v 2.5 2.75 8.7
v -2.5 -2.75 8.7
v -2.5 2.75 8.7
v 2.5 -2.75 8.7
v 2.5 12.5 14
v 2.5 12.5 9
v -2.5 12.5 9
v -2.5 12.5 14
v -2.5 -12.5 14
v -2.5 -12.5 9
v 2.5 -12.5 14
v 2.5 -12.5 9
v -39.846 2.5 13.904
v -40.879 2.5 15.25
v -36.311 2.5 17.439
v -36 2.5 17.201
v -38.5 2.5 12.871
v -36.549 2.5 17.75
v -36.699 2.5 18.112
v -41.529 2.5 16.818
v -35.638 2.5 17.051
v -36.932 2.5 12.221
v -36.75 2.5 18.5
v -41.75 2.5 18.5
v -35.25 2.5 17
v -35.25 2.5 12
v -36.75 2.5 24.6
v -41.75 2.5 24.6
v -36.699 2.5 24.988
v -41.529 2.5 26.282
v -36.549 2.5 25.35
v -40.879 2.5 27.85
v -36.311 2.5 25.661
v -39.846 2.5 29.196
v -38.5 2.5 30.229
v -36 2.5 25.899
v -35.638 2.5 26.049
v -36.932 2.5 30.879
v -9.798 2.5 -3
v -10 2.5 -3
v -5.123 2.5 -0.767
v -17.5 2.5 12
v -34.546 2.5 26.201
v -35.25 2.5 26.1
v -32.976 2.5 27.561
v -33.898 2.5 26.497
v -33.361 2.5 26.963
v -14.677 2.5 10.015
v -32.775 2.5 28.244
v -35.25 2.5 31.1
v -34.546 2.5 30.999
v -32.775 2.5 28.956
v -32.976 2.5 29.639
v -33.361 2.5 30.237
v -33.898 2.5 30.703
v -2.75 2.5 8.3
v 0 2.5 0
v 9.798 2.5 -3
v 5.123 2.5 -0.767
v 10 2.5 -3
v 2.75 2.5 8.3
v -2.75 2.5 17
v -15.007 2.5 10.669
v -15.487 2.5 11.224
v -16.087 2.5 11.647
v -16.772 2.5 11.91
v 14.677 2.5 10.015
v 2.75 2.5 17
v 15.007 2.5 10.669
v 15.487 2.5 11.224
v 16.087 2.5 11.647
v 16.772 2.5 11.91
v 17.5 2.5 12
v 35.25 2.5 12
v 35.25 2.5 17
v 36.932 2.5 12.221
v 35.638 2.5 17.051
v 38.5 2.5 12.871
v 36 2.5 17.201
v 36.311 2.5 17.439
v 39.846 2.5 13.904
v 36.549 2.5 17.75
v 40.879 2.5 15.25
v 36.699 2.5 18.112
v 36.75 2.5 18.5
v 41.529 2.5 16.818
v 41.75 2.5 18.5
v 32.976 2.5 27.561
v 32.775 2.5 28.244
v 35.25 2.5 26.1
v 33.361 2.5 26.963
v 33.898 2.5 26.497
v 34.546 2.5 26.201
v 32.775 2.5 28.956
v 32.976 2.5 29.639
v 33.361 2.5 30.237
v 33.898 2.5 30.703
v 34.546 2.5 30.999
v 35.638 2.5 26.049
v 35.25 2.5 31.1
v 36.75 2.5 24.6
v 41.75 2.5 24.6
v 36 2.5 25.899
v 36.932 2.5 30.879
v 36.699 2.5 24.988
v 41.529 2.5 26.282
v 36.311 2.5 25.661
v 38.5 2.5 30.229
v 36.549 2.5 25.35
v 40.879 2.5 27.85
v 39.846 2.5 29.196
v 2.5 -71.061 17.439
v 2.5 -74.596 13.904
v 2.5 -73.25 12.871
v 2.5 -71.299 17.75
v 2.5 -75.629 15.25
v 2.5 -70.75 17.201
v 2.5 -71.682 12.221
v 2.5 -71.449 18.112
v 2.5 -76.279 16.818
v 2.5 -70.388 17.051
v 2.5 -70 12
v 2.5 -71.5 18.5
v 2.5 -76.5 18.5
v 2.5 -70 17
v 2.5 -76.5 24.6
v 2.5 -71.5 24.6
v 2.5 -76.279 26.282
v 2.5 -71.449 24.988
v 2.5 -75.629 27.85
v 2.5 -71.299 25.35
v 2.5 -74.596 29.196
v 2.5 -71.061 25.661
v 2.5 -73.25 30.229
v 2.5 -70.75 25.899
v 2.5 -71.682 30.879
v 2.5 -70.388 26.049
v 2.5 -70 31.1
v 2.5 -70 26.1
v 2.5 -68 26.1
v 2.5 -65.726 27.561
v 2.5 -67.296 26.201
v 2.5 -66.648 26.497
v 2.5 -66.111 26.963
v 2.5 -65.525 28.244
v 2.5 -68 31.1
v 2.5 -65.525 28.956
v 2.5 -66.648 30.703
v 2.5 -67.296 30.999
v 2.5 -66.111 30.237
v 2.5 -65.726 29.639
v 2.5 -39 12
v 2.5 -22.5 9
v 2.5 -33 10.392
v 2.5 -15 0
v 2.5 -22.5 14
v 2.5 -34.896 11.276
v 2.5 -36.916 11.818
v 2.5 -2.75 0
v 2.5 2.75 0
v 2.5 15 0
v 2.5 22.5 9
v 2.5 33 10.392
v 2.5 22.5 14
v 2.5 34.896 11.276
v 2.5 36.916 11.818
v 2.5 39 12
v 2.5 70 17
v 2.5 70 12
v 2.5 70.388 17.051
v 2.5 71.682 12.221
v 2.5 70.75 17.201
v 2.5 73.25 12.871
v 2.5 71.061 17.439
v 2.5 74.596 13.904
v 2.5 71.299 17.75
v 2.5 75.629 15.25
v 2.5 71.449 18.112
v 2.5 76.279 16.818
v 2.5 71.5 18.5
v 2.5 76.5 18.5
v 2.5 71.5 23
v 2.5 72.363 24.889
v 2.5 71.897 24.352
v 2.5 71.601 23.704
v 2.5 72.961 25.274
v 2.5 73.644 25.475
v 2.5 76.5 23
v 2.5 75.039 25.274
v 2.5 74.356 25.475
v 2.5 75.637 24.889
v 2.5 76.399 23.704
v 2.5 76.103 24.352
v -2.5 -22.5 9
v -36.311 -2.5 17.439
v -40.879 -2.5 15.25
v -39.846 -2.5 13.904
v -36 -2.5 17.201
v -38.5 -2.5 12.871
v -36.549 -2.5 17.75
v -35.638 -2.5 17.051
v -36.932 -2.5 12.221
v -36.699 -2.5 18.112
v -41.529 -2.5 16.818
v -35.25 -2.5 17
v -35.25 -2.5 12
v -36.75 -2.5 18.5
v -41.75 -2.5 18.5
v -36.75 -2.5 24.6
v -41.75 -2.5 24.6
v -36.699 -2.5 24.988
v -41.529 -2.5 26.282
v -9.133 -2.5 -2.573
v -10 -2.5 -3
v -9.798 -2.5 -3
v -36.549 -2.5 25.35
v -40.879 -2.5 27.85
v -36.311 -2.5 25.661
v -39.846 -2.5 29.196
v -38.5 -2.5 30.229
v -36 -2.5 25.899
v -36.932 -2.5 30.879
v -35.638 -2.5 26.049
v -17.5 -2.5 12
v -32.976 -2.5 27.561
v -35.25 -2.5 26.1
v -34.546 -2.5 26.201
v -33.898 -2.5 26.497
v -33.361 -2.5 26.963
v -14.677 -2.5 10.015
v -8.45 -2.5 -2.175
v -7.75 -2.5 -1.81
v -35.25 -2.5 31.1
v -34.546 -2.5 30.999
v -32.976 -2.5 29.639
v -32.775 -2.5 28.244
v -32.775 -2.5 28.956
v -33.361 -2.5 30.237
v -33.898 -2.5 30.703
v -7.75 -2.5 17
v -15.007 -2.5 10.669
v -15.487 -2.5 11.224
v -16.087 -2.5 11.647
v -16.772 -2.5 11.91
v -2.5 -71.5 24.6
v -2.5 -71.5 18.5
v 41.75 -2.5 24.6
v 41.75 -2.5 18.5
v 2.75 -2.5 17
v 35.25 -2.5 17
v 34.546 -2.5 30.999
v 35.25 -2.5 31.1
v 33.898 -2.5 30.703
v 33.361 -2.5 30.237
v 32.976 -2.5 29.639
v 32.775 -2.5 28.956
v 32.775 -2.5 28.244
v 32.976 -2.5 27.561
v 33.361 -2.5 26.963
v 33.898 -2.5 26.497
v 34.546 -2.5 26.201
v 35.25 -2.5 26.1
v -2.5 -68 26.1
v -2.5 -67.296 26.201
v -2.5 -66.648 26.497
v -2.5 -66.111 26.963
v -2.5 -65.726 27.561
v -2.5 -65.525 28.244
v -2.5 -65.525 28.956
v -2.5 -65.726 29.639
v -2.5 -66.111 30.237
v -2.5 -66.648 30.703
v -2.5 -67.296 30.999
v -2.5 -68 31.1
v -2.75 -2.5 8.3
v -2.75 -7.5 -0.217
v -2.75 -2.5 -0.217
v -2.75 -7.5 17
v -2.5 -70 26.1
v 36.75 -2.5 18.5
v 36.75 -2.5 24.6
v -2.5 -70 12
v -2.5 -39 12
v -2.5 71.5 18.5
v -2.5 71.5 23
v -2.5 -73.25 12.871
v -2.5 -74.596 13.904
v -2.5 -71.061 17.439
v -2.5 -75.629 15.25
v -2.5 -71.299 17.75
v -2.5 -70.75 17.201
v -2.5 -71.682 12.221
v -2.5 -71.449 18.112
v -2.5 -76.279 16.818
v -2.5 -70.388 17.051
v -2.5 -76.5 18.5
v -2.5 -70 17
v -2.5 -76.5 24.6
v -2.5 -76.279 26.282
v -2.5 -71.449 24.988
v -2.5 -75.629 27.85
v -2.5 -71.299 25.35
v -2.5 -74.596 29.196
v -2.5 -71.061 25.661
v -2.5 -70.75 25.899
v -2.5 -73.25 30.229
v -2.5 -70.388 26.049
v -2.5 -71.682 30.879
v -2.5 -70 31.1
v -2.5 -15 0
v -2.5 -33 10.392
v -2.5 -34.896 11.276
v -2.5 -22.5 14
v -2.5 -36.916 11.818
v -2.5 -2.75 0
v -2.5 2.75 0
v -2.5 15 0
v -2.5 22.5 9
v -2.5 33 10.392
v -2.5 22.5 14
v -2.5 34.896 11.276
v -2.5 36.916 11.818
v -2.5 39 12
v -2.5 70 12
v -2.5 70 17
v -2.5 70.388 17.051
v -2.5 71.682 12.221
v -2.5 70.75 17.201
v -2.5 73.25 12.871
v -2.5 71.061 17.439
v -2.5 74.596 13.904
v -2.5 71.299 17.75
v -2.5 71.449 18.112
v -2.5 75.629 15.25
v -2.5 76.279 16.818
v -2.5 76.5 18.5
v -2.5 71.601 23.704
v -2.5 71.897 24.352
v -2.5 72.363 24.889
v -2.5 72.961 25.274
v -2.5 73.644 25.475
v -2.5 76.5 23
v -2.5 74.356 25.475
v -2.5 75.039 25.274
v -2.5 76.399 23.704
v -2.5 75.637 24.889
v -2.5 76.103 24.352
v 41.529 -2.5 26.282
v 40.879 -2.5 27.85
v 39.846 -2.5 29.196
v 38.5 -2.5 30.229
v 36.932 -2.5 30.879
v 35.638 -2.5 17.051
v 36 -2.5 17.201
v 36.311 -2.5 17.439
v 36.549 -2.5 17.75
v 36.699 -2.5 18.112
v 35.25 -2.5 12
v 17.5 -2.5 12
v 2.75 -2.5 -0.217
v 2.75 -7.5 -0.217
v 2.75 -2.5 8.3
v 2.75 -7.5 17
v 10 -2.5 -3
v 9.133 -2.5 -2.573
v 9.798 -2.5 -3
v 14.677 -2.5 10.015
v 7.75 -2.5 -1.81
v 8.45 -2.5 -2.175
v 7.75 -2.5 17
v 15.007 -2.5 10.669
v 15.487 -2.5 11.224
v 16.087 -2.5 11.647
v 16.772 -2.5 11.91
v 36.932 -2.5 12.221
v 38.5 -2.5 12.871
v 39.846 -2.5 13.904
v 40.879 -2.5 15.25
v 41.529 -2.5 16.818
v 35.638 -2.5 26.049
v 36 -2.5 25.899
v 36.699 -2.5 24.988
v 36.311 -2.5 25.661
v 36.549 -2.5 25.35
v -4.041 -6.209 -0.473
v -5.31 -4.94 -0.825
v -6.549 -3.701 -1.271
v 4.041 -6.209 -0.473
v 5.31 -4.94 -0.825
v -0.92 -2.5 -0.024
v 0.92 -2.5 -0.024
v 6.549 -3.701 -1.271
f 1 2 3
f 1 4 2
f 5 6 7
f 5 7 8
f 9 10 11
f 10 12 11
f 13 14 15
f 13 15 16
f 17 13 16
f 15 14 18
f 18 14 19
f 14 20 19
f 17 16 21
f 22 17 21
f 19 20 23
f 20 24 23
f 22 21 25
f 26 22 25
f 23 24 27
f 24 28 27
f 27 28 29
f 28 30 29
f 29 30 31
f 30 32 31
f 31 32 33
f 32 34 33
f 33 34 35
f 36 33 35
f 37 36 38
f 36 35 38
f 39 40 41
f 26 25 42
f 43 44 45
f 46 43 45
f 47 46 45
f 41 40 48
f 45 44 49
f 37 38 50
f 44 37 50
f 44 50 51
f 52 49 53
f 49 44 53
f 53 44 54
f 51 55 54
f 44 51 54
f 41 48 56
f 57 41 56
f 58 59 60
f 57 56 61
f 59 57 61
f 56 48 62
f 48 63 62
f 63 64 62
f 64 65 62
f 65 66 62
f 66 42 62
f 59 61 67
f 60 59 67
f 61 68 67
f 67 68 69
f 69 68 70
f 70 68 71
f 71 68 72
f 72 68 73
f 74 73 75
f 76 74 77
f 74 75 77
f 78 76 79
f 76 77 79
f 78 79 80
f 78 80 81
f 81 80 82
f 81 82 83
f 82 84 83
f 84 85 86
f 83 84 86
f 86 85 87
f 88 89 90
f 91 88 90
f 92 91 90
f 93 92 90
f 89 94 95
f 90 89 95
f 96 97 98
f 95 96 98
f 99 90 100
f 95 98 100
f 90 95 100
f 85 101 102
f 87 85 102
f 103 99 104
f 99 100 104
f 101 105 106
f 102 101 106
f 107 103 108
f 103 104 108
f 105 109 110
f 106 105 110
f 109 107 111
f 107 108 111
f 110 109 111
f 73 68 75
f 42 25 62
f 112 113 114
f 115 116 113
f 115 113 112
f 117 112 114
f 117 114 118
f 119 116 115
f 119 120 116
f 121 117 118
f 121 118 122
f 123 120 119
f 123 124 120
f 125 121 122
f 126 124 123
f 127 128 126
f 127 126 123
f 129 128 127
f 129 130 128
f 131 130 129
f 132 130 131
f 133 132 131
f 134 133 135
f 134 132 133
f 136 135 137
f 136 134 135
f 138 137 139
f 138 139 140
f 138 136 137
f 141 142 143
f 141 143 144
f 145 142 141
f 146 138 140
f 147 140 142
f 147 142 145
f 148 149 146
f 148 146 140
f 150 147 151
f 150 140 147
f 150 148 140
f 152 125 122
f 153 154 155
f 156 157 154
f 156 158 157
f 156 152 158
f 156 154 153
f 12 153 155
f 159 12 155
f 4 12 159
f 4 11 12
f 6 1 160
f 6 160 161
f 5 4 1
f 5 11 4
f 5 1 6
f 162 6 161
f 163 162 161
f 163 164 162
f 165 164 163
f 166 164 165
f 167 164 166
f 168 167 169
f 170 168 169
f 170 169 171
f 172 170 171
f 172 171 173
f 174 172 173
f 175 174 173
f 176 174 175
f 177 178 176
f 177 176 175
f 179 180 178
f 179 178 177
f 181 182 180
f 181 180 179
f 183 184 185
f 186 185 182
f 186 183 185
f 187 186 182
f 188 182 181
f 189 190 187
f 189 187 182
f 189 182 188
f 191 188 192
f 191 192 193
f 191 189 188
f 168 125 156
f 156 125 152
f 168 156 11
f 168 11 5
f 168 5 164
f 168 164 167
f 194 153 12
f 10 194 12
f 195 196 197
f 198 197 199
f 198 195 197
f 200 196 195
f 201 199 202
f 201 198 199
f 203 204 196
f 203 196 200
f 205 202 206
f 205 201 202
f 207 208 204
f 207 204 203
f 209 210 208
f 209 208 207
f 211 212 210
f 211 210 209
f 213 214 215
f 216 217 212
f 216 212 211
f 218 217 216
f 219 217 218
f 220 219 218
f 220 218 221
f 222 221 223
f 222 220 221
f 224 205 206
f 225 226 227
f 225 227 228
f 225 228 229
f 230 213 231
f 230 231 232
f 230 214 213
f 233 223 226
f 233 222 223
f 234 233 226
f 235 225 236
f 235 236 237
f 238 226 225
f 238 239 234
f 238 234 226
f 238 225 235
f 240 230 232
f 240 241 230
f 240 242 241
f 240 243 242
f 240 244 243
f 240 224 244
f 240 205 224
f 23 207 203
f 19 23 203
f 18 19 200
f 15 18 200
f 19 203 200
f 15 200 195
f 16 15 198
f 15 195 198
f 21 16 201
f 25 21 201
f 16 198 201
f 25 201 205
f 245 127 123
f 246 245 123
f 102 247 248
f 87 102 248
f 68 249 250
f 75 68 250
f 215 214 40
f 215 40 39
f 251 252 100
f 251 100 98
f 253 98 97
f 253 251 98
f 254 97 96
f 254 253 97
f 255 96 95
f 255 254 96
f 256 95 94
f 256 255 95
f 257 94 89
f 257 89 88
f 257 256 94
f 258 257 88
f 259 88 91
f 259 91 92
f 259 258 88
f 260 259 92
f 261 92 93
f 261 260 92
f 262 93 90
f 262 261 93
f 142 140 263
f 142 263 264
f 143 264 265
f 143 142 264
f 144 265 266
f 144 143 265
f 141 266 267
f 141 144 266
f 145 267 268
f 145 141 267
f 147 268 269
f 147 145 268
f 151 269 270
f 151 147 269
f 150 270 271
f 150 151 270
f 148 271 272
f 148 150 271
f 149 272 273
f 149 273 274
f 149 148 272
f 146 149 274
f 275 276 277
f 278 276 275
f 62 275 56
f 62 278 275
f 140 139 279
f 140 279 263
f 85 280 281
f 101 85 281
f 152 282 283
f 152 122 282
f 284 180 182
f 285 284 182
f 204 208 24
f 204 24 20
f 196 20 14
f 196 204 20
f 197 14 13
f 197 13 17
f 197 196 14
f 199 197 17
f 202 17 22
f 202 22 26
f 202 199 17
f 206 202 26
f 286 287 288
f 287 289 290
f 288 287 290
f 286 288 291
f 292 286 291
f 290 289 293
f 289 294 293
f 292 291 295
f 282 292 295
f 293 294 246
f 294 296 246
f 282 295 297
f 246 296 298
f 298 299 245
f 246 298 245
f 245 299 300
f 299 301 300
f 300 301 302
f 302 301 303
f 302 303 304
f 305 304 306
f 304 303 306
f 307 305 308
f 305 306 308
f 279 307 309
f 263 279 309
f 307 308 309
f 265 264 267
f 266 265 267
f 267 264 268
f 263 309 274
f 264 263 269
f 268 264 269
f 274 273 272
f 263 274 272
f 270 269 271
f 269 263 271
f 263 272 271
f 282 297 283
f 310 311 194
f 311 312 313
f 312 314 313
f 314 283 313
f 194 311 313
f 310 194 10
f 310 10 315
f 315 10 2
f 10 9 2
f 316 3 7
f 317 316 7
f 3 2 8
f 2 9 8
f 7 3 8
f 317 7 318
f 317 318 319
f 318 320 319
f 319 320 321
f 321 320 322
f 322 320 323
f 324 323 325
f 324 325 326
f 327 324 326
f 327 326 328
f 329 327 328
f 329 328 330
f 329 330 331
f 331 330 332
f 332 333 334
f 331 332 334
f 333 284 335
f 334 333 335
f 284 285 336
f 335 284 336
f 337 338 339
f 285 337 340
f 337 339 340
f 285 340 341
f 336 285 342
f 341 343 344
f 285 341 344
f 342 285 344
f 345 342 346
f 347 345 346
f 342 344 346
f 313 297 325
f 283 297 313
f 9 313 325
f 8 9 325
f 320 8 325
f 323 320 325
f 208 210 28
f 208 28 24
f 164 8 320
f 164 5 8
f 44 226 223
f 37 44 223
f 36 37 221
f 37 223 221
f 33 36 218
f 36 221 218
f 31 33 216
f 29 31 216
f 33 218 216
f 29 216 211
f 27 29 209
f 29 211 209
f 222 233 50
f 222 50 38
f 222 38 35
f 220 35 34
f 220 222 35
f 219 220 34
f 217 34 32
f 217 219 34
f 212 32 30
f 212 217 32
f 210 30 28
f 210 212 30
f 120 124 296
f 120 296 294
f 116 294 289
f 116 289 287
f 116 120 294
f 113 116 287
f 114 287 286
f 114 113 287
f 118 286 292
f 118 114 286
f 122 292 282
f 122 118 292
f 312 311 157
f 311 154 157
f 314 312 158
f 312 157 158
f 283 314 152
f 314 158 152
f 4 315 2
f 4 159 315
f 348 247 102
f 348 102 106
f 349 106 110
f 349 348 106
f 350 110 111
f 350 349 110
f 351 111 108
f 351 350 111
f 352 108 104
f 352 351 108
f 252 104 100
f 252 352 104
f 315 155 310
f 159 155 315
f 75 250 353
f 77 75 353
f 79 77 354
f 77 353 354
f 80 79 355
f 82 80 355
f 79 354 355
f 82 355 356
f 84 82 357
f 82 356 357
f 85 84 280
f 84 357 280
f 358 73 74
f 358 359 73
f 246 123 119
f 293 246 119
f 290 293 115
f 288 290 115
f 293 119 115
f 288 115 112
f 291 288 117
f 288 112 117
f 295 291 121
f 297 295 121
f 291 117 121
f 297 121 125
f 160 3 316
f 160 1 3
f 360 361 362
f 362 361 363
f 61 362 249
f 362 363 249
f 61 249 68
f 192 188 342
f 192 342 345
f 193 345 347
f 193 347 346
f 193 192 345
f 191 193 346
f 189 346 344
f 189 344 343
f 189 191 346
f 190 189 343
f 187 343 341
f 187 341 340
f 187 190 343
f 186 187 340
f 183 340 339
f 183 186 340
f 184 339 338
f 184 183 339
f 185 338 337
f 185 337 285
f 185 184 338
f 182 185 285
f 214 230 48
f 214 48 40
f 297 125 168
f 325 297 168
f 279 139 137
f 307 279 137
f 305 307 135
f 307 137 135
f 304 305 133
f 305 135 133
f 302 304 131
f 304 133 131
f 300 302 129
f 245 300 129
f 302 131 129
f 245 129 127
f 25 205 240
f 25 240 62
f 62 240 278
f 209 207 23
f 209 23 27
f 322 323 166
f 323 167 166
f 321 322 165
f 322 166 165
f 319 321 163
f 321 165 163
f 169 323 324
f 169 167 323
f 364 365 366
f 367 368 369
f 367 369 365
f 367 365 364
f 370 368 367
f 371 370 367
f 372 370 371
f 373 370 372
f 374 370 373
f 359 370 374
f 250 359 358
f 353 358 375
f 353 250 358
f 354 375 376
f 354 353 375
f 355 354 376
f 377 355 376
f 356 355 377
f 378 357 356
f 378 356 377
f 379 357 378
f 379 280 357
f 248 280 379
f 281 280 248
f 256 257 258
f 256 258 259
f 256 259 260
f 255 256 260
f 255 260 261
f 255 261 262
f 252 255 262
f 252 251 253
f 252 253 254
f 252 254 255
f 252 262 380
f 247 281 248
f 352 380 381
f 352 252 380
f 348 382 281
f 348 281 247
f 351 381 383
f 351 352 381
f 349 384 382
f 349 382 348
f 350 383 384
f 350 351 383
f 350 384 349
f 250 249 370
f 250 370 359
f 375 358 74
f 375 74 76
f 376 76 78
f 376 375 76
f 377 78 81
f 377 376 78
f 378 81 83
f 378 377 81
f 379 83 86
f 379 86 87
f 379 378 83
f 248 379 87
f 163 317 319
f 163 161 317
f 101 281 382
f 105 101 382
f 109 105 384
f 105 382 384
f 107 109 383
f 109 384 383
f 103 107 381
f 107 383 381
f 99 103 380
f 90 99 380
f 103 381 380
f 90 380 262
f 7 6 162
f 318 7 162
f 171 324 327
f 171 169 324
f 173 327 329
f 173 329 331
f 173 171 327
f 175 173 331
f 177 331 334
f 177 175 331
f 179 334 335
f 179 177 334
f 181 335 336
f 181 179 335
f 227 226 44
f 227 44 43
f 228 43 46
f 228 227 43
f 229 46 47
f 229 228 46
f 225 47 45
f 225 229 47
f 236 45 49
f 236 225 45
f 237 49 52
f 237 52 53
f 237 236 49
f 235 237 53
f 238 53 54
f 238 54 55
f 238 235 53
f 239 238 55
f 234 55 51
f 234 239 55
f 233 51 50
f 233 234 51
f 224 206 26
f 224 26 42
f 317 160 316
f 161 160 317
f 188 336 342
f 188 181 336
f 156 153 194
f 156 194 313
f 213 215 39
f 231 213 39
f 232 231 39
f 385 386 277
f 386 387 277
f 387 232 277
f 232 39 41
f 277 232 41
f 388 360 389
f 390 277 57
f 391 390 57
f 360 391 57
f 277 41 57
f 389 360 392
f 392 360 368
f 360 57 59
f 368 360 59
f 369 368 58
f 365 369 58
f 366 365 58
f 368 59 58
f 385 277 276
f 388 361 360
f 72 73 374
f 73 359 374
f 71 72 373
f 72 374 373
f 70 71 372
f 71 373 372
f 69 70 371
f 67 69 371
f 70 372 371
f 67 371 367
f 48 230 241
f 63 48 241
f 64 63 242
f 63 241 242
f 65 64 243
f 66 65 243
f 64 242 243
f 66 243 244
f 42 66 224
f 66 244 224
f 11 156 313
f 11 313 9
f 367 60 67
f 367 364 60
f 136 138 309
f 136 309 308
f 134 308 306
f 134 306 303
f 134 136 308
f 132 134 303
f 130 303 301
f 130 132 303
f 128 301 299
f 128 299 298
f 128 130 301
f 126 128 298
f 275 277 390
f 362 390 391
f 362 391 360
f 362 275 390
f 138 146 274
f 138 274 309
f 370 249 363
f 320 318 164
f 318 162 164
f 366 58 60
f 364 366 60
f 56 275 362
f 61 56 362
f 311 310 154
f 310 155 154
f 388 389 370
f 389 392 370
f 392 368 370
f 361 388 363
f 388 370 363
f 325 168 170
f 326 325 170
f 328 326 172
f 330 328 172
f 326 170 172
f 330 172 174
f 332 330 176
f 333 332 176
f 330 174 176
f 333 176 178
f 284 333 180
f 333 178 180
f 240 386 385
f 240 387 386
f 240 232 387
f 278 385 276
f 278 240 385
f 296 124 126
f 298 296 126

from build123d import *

# Parameters (mm, degrees)
SKETCH_W     = 10
SKETCH_H     = 5
PAD_DEPTH    = 2.5
PAD001_DEPTH = 2.5
PAD002_DEPTH = 20
POCKET_DEPTH = 10


with BuildPart() as vertical:
    # Sketch → Pad (new body, symmetric)
    with BuildSketch(Plane.YZ):
        with BuildLine():
            Line((76.5, 18.5), (76.5, 22.999997))
            ThreePointArc((76.5, 22.999997), (74.000001, 25.499998), (71.5, 23))
            Line((71.5, 18.499997), (71.5, 23))
            ThreePointArc((69.999998, 17), (71.060658, 17.439339), (71.5, 18.499997))
            Line((-69.999999, 17), (69.999998, 17))
            ThreePointArc((-71.5, 18.499997), (-71.060659, 17.439338), (-69.999999, 17))
            Line((-71.5, 24.600004), (-71.5, 18.499997))
            ThreePointArc((-69.999999, 26.1), (-71.060659, 25.660662), (-71.5, 24.600004))
            Line((-69.999999, 26.1), (-67.999999, 26.1))
            ThreePointArc((-67.999999, 26.1), (-65.499998, 28.599999), (-67.999997, 31.1))
            Line((-67.999997, 31.1), (-69.999999, 31.1))
            ThreePointArc((-69.999999, 31.1), (-74.596194, 29.196194), (-76.5, 24.6))
            Line((-76.5, 18.499997), (-76.5, 24.6))
            ThreePointArc((-76.5, 18.499997), (-74.596193, 13.903805), (-69.999999, 12))
            Line((-69.999999, 12), (-38.999983, 12))
            ThreePointArc((-33, 10.392302), (-35.894162, 11.591109), (-38.999983, 12))
            Line((-15, 0), (-33, 10.392302))
            Line((-15, 0), (-2.75, 0))
            Line((-2.75, 0), (-2.75, 8.7))
            Line((-2.75, 8.7), (2.75, 8.7))
            Line((2.75, 8.7), (2.75, 0))
            Line((2.75, 0), (15, 0))
            Line((15, 0), (33, 10.392302))
            ThreePointArc((38.999983, 12), (35.894162, 11.591109), (33, 10.392302))
            Line((38.999983, 12), (70, 12))
            ThreePointArc((70, 12), (74.596194, 13.903806), (76.5, 18.5))
        make_face()
        with Locations((-17.5, 11.5)):
            Rectangle(SKETCH_W, SKETCH_H, mode=Mode.SUBTRACT)
        with Locations((17.5, 11.5)):
            Rectangle(SKETCH_W, SKETCH_H, mode=Mode.SUBTRACT)
    extrude(amount=PAD_DEPTH, both=True)


with BuildPart() as fusion:
    # Sketch001 → Pad001 (new body, symmetric)
    with BuildSketch(Plane.XZ):
        with BuildLine():
            Line((17.5, 11.999995), (35.250002, 12))
            ThreePointArc((35.250002, 12), (39.846193, 13.903805), (41.75, 18.499995))
            Line((41.75, 24.599994), (41.75, 18.499995))
            ThreePointArc((41.75, 24.599994), (39.846193, 29.196186), (35.249999, 31.09999))
            ThreePointArc((35.249999, 31.09999), (32.749999, 28.59999), (35.249999, 26.09999))
            ThreePointArc((36.75, 24.599994), (36.310659, 25.660652), (35.249999, 26.09999))
            Line((36.75, 18.499995), (36.75, 24.599994))
            ThreePointArc((35.249999, 17), (36.310658, 17.439338), (36.75, 18.499995))
            Line((2.75, 17), (35.249999, 17))
            Line((2.75, 8.3), (2.75, 17))
            Line((-2.75, 8.3), (2.75, 8.3))
            Line((-2.75, 16.999995), (-2.75, 8.3))
            Line((-35.25, 16.999995), (-2.75, 16.999995))
            ThreePointArc((-36.75, 18.499995), (-36.31066, 17.439335), (-35.25, 16.999995))
            Line((-36.75, 18.499995), (-36.75, 24.599994))
            ThreePointArc((-35.249999, 26.099995), (-36.31066, 25.660655), (-36.75, 24.599994))
            ThreePointArc((-35.249999, 26.099995), (-32.749999, 28.599995), (-35.249999, 31.099995))
            ThreePointArc((-35.249999, 31.099995), (-39.846194, 29.196189), (-41.75, 24.599994))
            Line((-41.75, 24.599994), (-41.75, 18.499995))
            ThreePointArc((-41.75, 18.499995), (-39.846194, 13.903801), (-35.249999, 11.999995))
            Line((-35.249999, 11.999995), (-17.5, 11.999995))
            ThreePointArc((-14.676752, 10.014525), (-15.774252, 11.453929), (-17.5, 11.999995))
            Line((-14.676752, 10.014525), (-10, -3))
            Line((-10, -3), (10, -3))
            Line((10, -3), (14.676753, 10.014525))
            ThreePointArc((17.5, 11.999995), (15.774253, 11.453929), (14.676753, 10.014525))
        make_face()
    extrude(amount=PAD001_DEPTH, both=True)

    # Sketch002 → Pad002 (new body)
    with BuildSketch(Plane(origin=(0, 0, 16.999995), x_dir=(-1, 0, 0), z_dir=(0, 0, 1))):
        Polygon((-7.75, 2.5), (-2.75, 7.5), (-2.75, 2.5), align=None)
        Polygon((2.75, 7.5), (2.75, 2.5), (7.75, 2.5), align=None)
    extrude(amount=-PAD002_DEPTH)

    # Sketch003 → Pocket (cut)
    with BuildSketch(Plane(origin=(0, 2.5, 0), x_dir=(1, 0, 0), z_dir=(0, 1, 0))):
        with BuildLine():
            ThreePointArc((-10, 3.138593), (0, 0), (10, 3.138593))
            Line((-10, 3.138593), (10, 3.138593))
        make_face()
    extrude(amount=-POCKET_DEPTH, mode=Mode.SUBTRACT)

    # Fusion: union Vertical
    add(vertical.part)


solid = fusion.part
